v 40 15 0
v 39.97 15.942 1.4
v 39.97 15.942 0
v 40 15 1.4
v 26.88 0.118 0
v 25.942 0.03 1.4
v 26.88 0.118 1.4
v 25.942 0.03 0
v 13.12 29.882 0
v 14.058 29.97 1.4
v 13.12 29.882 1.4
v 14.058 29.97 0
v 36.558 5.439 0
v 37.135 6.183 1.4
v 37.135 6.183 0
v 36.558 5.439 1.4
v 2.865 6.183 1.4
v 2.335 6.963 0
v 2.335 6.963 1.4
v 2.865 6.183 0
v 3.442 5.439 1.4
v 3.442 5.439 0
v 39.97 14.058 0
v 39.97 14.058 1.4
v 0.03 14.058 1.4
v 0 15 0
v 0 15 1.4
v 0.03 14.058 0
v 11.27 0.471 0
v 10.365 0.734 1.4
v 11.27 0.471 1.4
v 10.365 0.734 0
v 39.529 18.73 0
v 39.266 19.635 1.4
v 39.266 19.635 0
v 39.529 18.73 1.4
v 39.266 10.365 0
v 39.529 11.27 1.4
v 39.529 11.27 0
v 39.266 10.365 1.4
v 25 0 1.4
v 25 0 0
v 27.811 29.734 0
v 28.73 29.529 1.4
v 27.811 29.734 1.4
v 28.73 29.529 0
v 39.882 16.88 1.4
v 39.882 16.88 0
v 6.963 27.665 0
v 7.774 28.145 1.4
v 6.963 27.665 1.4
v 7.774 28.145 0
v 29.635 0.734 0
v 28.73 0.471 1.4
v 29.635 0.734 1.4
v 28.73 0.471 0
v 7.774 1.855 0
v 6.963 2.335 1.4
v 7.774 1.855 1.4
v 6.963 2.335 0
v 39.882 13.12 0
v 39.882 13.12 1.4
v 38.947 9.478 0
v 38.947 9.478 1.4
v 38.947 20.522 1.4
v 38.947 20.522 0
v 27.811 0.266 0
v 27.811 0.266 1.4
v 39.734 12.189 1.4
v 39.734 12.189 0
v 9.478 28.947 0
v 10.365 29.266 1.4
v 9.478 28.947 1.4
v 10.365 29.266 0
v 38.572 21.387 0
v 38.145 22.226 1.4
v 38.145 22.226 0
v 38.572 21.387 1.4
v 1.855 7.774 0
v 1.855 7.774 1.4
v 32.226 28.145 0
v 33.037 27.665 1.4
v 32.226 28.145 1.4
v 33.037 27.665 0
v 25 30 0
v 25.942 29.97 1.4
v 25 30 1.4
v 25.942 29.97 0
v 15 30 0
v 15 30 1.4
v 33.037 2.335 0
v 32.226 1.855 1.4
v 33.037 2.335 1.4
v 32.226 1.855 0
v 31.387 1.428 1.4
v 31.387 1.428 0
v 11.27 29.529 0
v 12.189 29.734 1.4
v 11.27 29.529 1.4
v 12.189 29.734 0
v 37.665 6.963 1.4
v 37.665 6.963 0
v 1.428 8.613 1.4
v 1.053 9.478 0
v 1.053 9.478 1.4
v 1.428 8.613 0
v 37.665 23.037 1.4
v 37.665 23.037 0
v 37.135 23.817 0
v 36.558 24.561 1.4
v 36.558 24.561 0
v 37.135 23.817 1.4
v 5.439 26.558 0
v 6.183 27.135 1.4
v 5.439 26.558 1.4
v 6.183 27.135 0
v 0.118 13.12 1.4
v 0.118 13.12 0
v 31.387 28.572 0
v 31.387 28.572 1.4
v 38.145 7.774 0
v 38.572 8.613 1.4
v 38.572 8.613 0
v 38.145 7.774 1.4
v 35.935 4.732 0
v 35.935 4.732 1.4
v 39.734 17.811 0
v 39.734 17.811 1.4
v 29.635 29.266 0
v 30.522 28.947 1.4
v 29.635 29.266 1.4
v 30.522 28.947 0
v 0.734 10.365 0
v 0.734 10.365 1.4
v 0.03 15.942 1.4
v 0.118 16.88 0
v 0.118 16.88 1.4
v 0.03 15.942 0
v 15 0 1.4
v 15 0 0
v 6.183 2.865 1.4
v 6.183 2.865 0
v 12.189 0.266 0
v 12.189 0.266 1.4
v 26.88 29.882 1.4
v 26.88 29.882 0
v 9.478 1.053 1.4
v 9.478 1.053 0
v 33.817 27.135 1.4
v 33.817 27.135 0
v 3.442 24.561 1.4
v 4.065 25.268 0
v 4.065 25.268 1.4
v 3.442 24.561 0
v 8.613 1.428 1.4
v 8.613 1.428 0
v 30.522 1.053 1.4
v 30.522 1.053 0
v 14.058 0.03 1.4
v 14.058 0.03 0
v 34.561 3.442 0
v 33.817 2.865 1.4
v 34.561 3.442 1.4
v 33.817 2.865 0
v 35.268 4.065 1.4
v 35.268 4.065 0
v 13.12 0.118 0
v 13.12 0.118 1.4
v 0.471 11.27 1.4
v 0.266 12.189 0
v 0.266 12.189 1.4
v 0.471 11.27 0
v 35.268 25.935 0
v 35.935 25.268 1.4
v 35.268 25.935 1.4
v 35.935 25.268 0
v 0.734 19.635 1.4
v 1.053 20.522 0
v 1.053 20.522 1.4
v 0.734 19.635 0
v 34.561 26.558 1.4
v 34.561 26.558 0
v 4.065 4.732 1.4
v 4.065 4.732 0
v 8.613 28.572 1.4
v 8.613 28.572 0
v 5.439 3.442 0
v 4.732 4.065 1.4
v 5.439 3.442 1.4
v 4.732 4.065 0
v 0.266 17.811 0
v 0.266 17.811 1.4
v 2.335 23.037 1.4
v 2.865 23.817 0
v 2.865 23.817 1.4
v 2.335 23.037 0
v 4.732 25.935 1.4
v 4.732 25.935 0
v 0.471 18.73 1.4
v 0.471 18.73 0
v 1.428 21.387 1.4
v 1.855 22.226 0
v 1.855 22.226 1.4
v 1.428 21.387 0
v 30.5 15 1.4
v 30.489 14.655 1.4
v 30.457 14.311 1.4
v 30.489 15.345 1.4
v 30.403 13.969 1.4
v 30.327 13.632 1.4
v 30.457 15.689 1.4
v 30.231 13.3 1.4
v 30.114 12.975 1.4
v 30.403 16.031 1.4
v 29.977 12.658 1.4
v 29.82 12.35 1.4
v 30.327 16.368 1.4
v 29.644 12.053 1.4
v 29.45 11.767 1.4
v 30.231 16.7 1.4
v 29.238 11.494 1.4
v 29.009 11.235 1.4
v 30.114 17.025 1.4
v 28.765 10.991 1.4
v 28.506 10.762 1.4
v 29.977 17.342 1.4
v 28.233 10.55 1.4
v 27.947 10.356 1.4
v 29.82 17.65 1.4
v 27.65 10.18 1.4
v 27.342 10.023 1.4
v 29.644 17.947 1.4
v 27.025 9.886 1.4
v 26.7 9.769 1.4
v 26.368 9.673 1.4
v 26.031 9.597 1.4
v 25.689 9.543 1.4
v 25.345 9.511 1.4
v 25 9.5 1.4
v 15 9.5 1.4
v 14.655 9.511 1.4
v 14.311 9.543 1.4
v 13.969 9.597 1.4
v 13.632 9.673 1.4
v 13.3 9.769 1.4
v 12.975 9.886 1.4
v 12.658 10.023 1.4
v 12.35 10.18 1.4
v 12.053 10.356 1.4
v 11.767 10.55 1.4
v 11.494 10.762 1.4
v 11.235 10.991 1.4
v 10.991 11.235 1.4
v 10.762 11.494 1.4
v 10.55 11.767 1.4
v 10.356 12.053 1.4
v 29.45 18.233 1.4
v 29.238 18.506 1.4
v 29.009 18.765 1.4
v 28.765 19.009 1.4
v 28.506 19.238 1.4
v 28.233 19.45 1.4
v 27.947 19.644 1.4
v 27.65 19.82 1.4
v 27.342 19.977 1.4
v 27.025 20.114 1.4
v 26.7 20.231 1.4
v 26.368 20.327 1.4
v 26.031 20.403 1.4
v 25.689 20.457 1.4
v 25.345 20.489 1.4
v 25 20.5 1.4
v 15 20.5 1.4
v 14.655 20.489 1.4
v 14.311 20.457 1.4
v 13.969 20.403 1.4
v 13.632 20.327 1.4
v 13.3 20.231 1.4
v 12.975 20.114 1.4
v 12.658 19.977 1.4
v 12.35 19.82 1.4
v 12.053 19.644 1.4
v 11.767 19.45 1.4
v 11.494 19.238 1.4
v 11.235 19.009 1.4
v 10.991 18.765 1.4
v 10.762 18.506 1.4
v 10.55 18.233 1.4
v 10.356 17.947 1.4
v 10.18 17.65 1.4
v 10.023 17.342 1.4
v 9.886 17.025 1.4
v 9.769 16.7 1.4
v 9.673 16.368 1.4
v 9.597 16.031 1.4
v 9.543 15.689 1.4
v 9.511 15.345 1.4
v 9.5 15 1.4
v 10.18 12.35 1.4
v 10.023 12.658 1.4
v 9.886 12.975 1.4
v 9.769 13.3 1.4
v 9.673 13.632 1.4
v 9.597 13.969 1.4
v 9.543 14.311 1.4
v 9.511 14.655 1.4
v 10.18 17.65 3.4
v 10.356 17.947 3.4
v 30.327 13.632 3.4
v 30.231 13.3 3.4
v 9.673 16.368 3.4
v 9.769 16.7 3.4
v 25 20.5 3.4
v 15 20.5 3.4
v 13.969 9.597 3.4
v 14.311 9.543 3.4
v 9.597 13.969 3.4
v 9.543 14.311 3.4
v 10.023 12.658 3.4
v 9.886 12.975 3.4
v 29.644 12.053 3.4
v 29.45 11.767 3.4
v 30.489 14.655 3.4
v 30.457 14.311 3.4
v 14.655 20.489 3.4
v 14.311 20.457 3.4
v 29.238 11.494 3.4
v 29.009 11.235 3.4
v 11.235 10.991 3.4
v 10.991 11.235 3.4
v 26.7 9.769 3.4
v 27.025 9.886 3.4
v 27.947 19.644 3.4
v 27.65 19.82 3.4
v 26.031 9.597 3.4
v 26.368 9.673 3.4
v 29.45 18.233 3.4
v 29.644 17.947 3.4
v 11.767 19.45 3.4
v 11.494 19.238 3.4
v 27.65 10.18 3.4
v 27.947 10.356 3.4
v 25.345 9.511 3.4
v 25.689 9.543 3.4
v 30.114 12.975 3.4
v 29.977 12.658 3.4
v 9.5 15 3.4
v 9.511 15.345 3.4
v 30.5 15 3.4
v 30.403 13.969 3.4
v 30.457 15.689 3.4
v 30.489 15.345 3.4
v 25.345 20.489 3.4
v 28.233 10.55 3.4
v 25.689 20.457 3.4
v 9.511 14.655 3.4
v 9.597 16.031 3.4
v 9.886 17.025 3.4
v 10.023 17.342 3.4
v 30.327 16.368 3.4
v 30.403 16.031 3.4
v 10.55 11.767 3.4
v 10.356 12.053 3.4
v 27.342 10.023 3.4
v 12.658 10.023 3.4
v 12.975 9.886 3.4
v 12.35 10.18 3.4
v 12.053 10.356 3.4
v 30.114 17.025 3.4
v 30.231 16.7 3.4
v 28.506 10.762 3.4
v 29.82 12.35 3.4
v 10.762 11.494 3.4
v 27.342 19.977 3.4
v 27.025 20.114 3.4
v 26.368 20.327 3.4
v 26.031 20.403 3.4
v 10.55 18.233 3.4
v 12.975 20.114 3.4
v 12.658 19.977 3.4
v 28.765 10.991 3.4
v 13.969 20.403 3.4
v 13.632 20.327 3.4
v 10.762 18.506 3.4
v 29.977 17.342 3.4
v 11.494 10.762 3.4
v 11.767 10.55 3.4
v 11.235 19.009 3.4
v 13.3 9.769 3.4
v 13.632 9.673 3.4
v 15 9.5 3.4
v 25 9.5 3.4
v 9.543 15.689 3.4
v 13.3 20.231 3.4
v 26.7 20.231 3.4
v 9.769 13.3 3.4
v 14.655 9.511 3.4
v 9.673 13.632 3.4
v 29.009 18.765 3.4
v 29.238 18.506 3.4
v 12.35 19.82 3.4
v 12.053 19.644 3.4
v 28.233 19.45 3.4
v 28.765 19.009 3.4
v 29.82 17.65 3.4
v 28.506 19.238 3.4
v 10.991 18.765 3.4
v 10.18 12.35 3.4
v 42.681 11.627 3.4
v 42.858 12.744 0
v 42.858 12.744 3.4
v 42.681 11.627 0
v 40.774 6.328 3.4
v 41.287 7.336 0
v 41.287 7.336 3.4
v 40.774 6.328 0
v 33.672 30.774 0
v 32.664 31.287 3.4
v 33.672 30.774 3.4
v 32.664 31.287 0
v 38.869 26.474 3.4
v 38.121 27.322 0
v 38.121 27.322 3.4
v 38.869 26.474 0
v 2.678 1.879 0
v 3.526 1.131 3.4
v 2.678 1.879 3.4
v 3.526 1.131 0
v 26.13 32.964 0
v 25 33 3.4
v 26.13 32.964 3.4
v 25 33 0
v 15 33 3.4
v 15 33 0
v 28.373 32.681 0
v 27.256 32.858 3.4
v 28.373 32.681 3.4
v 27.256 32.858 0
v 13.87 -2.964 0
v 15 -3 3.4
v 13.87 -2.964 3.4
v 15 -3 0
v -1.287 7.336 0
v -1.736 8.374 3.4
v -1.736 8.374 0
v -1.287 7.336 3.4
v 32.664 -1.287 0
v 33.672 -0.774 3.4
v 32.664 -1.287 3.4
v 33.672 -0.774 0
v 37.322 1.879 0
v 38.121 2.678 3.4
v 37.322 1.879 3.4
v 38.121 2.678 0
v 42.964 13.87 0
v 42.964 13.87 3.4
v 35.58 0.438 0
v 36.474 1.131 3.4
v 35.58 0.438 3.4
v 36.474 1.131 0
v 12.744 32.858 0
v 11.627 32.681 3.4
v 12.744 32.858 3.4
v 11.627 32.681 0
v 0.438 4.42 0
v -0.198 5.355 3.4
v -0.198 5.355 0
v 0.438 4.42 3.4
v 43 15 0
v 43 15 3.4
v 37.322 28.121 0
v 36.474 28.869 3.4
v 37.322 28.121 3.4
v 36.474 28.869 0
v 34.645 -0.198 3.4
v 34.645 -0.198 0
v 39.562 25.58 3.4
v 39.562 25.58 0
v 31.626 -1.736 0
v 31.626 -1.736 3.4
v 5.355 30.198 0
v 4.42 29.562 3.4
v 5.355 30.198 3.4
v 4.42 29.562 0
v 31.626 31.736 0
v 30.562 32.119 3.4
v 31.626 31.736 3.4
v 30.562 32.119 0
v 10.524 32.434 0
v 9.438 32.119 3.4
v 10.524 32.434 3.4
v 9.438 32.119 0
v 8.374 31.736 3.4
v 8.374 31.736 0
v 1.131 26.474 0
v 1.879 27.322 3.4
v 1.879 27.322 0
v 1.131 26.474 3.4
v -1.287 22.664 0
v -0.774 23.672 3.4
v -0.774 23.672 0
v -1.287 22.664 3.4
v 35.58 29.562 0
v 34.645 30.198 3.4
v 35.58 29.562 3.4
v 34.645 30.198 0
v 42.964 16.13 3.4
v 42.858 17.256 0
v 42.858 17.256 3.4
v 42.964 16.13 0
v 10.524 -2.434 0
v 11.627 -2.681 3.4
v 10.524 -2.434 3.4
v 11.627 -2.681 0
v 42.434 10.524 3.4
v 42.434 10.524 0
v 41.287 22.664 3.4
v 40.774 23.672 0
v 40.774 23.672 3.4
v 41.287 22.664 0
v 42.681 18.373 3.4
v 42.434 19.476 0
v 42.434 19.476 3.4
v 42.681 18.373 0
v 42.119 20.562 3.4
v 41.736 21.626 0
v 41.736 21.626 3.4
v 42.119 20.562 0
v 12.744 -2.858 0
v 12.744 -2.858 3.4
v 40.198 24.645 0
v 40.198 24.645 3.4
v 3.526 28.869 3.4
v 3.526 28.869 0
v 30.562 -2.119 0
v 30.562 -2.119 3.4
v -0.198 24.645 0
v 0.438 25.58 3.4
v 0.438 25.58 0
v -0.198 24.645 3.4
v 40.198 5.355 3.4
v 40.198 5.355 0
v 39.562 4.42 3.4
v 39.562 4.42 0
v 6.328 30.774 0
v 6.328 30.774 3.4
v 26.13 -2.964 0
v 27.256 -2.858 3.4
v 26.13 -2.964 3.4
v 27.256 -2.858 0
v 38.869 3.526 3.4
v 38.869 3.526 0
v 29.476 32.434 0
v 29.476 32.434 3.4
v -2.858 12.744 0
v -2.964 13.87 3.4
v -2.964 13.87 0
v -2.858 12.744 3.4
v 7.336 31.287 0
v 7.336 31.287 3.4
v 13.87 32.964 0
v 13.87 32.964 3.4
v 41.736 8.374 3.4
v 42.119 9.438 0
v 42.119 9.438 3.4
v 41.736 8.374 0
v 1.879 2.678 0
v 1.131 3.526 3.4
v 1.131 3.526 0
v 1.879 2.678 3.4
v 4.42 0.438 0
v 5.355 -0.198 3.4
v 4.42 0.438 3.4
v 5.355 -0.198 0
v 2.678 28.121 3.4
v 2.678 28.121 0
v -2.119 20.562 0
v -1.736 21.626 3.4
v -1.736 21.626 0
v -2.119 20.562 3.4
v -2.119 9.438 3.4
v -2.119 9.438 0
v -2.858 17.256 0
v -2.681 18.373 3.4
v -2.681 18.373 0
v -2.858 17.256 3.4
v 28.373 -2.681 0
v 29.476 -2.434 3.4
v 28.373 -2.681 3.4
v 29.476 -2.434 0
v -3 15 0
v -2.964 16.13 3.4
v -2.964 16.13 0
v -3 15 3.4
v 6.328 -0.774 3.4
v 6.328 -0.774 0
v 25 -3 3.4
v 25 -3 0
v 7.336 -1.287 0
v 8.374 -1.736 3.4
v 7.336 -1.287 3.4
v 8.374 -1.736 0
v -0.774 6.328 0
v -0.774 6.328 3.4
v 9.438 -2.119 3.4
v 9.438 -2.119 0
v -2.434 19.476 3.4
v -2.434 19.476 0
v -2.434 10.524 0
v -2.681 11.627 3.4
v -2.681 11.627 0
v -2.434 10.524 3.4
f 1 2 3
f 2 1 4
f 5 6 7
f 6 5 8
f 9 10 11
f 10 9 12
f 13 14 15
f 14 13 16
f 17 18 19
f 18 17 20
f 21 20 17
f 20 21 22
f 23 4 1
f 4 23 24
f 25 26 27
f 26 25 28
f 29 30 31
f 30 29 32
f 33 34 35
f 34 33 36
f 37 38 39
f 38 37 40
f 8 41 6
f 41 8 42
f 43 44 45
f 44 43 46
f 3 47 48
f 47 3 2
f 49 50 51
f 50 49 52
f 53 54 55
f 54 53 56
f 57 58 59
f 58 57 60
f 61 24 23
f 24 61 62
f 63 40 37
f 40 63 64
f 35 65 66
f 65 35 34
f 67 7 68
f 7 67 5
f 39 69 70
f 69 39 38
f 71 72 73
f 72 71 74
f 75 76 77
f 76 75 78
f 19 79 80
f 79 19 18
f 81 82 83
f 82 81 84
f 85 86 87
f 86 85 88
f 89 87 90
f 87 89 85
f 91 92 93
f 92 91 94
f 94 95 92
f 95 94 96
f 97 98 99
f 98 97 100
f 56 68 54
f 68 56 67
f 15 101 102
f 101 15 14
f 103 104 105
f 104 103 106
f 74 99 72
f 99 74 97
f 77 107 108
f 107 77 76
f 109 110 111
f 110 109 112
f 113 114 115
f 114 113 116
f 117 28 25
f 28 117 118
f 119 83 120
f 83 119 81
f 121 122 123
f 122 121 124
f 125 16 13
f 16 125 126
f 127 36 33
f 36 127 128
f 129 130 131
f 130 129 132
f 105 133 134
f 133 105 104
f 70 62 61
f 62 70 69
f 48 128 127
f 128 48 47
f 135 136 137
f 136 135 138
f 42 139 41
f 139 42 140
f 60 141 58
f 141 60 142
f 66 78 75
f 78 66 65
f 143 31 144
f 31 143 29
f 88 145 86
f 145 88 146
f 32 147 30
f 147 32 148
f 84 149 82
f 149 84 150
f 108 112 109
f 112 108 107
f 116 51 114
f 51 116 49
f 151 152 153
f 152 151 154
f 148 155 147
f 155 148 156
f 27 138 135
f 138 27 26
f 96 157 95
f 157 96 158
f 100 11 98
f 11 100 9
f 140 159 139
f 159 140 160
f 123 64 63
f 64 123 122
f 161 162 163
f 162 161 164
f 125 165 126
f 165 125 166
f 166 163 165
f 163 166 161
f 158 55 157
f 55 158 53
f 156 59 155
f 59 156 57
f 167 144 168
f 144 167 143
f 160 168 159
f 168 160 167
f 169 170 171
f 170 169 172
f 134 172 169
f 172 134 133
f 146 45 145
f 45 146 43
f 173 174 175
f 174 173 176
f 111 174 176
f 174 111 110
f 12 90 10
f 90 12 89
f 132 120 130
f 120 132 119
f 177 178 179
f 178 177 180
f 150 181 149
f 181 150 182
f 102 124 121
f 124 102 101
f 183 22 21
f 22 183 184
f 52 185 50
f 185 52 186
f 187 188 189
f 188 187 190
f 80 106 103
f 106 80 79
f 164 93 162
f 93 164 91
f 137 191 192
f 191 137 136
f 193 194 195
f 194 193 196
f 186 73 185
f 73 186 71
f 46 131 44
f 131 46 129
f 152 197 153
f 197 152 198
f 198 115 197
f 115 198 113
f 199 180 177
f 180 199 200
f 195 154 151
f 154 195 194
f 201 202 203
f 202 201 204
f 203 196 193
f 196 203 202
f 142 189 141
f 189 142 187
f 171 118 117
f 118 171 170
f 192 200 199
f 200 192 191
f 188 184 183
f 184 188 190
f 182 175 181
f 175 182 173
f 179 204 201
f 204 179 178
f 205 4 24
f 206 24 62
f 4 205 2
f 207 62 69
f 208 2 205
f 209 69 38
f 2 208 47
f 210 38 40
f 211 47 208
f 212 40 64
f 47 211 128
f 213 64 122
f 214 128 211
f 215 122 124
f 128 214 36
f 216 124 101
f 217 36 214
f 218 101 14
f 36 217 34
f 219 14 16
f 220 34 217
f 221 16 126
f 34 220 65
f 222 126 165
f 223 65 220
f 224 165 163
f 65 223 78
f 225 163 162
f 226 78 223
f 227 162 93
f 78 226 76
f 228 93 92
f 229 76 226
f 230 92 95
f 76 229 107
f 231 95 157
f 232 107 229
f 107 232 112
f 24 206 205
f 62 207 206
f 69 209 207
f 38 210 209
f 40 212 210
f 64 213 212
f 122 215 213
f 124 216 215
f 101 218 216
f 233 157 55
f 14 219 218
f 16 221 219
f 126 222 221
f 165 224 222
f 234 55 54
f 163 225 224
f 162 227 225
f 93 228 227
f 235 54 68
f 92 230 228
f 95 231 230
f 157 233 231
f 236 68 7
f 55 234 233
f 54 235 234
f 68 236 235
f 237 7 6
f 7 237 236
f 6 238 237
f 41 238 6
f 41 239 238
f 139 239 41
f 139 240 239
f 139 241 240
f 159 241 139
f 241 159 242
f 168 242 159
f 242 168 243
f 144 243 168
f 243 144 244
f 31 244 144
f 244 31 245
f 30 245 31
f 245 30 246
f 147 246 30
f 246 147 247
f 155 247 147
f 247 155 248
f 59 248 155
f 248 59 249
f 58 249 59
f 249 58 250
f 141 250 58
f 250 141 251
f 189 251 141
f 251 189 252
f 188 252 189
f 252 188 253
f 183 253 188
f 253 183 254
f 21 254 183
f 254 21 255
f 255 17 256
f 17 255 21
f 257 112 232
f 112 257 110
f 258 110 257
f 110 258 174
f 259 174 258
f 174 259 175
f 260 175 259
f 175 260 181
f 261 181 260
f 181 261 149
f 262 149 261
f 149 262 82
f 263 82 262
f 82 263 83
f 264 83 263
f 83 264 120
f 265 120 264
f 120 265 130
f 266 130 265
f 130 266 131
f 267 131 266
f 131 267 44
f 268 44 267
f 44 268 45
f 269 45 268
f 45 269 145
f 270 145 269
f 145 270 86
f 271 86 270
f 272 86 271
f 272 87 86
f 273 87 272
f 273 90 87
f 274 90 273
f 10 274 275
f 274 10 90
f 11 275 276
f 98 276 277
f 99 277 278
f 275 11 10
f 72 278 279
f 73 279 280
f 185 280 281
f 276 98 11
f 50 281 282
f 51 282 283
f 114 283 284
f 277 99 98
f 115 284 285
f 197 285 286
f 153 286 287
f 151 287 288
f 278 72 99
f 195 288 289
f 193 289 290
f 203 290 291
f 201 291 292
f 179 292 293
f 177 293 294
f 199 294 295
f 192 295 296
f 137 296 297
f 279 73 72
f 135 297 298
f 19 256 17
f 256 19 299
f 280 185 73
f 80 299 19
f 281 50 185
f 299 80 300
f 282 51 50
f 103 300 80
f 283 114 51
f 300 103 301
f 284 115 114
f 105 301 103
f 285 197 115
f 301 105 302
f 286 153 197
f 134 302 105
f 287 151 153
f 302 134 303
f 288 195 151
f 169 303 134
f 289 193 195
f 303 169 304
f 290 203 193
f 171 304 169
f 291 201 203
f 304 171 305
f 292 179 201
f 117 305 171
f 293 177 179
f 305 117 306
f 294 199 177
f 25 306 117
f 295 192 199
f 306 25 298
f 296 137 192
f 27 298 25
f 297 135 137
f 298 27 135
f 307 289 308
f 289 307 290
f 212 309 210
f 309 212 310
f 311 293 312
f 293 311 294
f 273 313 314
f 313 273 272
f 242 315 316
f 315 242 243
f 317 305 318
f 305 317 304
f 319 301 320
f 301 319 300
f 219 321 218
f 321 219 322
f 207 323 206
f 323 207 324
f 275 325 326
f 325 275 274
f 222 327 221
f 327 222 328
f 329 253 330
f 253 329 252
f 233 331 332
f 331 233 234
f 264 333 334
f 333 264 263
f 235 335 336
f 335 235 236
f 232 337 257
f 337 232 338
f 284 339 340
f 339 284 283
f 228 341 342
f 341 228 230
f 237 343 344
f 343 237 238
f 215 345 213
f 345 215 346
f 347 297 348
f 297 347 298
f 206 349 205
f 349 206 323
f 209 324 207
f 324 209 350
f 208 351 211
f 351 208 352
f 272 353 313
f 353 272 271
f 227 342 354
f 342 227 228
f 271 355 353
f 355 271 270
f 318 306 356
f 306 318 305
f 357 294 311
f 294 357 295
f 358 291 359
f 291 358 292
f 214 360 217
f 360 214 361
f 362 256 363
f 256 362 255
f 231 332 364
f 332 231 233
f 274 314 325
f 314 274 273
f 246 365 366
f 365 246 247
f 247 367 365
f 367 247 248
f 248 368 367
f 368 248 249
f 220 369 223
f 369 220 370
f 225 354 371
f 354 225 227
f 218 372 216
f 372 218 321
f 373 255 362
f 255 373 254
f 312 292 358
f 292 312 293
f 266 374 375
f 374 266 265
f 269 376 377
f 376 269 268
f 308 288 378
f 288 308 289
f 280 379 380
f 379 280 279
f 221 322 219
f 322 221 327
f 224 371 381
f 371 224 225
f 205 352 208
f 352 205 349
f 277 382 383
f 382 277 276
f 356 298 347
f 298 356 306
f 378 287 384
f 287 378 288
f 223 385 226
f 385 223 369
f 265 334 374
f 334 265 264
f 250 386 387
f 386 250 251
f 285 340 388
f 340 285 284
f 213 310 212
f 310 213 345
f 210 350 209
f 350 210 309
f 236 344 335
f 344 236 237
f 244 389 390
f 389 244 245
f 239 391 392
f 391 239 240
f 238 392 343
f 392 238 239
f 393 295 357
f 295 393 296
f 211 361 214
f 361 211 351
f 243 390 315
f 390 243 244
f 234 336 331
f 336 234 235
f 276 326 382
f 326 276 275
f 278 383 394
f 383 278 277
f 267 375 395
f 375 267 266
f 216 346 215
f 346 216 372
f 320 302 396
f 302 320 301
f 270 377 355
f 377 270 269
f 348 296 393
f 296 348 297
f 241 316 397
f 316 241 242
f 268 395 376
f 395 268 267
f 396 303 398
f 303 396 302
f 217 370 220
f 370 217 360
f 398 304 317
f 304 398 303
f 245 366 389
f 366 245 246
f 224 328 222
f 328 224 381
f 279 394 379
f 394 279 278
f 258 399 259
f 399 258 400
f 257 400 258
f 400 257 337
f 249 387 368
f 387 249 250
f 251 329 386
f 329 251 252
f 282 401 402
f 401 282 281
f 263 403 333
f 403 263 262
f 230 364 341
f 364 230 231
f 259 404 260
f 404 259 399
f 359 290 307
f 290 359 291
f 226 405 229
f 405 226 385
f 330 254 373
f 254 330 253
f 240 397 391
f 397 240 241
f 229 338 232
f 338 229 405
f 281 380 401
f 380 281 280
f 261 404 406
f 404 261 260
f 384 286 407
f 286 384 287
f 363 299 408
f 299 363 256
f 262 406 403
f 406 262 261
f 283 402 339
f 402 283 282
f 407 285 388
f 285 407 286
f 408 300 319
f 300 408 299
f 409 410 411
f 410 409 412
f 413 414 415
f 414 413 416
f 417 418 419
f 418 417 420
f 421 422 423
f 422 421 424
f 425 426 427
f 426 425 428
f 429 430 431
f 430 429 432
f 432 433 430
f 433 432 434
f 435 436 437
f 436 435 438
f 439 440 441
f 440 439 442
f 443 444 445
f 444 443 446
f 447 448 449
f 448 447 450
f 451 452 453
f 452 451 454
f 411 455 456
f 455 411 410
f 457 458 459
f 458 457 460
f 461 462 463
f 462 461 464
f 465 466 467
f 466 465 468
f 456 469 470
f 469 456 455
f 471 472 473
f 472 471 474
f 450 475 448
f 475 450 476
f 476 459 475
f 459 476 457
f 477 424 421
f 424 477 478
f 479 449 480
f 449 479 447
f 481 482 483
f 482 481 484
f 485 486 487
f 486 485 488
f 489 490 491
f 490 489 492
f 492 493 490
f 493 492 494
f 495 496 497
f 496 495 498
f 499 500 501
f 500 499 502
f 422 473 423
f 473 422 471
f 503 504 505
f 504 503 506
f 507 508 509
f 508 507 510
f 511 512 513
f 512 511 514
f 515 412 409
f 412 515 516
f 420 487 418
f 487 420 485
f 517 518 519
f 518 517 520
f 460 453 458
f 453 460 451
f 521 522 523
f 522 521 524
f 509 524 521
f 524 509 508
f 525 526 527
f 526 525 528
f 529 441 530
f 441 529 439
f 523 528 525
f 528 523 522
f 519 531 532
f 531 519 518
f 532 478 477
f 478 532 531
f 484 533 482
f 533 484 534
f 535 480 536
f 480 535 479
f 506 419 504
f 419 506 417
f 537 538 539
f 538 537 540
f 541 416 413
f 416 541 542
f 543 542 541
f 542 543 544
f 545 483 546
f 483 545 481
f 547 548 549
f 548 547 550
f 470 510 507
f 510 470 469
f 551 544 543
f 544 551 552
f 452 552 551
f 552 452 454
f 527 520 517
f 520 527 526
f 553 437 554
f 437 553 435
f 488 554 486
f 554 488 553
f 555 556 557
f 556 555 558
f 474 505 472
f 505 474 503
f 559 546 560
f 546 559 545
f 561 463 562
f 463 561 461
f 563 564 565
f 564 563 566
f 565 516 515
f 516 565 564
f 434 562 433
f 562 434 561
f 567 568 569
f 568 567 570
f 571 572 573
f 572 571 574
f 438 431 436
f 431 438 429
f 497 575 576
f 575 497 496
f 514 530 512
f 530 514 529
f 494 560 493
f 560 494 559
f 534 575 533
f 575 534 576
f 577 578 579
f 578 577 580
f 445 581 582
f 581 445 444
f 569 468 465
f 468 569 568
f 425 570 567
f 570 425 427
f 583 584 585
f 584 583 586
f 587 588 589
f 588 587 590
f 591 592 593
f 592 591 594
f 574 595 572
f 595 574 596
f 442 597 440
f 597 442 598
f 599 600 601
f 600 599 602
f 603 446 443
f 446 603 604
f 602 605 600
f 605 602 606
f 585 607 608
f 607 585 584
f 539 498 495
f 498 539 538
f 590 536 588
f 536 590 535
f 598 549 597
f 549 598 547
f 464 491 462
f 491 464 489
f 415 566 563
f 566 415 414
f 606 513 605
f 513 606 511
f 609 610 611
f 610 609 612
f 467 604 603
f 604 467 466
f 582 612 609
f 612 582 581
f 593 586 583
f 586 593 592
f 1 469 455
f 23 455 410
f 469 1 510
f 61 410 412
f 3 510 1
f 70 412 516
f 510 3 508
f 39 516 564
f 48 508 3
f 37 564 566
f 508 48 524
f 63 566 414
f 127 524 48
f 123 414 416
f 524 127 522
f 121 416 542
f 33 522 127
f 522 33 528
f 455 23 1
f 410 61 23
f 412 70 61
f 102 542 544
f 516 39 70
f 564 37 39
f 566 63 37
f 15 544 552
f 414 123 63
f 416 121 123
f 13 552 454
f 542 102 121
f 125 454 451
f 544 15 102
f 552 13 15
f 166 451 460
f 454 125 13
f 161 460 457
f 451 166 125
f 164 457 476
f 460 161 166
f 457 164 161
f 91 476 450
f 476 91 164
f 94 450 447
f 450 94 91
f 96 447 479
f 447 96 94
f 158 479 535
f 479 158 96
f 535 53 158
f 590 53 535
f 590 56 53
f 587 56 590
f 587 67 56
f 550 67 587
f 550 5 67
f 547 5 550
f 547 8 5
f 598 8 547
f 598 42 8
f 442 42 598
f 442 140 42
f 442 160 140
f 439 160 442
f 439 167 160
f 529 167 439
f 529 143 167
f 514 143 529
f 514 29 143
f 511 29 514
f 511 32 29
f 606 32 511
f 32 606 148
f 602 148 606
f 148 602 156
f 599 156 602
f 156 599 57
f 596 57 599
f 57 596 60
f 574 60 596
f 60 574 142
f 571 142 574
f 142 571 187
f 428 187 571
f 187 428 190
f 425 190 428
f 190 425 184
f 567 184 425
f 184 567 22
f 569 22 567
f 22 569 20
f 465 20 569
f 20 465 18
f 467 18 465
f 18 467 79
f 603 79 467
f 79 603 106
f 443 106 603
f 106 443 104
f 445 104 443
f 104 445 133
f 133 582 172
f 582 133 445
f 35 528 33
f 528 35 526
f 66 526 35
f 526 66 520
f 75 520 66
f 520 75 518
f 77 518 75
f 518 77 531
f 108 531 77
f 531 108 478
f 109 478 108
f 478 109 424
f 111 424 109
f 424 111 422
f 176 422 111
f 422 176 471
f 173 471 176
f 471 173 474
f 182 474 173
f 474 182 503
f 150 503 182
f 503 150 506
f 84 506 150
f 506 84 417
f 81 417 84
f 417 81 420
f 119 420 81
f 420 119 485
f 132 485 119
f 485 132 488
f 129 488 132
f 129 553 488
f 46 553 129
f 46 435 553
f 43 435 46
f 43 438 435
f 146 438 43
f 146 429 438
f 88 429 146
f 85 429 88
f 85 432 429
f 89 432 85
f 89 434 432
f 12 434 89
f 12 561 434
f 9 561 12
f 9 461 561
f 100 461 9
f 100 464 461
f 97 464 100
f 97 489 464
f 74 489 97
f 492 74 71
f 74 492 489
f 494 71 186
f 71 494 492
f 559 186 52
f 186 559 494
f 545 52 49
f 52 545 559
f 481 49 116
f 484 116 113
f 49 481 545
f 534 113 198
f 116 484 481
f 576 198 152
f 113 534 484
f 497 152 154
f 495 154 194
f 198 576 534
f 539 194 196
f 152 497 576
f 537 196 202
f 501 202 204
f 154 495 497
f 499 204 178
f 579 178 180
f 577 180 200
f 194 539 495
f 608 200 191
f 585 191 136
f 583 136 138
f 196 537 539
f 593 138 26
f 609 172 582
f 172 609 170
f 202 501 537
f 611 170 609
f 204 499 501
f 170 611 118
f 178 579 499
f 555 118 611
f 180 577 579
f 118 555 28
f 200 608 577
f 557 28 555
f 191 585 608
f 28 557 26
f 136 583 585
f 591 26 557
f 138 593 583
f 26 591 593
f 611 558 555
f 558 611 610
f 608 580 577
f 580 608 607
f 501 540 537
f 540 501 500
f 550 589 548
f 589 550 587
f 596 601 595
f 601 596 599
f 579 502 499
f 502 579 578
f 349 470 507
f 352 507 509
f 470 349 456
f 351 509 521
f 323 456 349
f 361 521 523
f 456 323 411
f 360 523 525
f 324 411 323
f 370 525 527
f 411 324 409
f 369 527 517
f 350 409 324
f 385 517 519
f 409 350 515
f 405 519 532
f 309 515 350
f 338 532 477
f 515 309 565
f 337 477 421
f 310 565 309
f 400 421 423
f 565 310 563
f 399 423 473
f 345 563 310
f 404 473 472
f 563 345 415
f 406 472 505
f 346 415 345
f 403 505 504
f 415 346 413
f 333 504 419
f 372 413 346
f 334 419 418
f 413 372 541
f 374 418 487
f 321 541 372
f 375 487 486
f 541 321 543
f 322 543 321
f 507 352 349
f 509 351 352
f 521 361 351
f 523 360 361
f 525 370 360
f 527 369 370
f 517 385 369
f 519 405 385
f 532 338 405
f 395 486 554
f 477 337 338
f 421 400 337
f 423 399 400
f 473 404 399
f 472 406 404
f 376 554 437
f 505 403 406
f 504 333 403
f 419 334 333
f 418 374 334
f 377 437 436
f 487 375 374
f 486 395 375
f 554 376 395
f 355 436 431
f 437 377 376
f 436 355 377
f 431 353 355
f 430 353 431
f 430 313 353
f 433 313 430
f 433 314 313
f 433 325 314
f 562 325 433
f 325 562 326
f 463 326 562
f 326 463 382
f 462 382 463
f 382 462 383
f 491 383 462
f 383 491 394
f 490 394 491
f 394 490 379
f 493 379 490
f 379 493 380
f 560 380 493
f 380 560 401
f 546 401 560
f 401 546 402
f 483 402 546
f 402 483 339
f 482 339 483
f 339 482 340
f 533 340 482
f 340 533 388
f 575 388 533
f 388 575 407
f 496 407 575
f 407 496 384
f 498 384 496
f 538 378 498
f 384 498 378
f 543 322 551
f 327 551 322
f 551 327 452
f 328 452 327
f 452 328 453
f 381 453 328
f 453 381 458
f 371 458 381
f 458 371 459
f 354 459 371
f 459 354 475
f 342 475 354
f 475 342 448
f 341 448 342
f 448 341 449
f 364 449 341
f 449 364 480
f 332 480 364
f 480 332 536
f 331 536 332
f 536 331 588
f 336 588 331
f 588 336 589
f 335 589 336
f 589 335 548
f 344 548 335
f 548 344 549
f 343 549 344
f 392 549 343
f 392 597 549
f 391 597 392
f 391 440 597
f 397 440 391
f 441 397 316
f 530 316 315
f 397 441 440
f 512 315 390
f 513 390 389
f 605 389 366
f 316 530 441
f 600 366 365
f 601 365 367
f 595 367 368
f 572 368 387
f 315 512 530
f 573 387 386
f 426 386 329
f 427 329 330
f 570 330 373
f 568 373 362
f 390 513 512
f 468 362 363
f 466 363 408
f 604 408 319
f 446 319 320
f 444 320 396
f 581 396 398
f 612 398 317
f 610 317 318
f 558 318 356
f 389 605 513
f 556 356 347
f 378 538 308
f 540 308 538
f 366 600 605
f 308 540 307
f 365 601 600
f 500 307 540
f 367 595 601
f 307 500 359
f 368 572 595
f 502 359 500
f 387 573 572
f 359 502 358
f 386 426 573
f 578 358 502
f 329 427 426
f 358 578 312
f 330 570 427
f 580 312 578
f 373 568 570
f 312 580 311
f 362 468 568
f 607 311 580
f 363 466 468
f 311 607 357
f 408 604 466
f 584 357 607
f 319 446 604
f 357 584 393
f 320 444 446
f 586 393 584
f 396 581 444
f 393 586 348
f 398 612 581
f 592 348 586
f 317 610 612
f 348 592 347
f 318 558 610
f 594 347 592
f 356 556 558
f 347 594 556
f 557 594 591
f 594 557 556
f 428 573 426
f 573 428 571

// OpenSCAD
D = 30; 
D2 = 11;
H = 3.4;

$fn=100;

translate([0,0,0]) 

difference(){
    translate([D/2,D/2,0])
    hull(){
        //translate([0,0,0])cylinder(h=H,d=D);
        //translate([D/2,0,0]) cylinder(h=H,d=D);
        //translate([0,0,0]) cylinder(h=H,d=10);
        //translate([D+D/3,0,0]) cylinder(h=H,d=10);
        //translate([0,D,0]) cylinder(h=H,d=10);
        //translate([D+D/3,D,0]) cylinder(h=H,d=10);

          translate([0,0,0]) cylinder(h=H,d=D+6);
          translate([D/3,0,0]) cylinder(h=H,d=D+6);
        
    }

    translate([D/2,D/2,-2])
    union(){
        hull(){
          translate([0,0,0]) cylinder(h=H,d=D);
          translate([D/3,0,0]) cylinder(h=H,d=D);
        }


        
        hull(){
          translate([0,0,0]) cylinder(h=H+10,d=D2);
          translate([D/3,0,0]) cylinder(h=H+10,d=D2);
        }
    }
}
